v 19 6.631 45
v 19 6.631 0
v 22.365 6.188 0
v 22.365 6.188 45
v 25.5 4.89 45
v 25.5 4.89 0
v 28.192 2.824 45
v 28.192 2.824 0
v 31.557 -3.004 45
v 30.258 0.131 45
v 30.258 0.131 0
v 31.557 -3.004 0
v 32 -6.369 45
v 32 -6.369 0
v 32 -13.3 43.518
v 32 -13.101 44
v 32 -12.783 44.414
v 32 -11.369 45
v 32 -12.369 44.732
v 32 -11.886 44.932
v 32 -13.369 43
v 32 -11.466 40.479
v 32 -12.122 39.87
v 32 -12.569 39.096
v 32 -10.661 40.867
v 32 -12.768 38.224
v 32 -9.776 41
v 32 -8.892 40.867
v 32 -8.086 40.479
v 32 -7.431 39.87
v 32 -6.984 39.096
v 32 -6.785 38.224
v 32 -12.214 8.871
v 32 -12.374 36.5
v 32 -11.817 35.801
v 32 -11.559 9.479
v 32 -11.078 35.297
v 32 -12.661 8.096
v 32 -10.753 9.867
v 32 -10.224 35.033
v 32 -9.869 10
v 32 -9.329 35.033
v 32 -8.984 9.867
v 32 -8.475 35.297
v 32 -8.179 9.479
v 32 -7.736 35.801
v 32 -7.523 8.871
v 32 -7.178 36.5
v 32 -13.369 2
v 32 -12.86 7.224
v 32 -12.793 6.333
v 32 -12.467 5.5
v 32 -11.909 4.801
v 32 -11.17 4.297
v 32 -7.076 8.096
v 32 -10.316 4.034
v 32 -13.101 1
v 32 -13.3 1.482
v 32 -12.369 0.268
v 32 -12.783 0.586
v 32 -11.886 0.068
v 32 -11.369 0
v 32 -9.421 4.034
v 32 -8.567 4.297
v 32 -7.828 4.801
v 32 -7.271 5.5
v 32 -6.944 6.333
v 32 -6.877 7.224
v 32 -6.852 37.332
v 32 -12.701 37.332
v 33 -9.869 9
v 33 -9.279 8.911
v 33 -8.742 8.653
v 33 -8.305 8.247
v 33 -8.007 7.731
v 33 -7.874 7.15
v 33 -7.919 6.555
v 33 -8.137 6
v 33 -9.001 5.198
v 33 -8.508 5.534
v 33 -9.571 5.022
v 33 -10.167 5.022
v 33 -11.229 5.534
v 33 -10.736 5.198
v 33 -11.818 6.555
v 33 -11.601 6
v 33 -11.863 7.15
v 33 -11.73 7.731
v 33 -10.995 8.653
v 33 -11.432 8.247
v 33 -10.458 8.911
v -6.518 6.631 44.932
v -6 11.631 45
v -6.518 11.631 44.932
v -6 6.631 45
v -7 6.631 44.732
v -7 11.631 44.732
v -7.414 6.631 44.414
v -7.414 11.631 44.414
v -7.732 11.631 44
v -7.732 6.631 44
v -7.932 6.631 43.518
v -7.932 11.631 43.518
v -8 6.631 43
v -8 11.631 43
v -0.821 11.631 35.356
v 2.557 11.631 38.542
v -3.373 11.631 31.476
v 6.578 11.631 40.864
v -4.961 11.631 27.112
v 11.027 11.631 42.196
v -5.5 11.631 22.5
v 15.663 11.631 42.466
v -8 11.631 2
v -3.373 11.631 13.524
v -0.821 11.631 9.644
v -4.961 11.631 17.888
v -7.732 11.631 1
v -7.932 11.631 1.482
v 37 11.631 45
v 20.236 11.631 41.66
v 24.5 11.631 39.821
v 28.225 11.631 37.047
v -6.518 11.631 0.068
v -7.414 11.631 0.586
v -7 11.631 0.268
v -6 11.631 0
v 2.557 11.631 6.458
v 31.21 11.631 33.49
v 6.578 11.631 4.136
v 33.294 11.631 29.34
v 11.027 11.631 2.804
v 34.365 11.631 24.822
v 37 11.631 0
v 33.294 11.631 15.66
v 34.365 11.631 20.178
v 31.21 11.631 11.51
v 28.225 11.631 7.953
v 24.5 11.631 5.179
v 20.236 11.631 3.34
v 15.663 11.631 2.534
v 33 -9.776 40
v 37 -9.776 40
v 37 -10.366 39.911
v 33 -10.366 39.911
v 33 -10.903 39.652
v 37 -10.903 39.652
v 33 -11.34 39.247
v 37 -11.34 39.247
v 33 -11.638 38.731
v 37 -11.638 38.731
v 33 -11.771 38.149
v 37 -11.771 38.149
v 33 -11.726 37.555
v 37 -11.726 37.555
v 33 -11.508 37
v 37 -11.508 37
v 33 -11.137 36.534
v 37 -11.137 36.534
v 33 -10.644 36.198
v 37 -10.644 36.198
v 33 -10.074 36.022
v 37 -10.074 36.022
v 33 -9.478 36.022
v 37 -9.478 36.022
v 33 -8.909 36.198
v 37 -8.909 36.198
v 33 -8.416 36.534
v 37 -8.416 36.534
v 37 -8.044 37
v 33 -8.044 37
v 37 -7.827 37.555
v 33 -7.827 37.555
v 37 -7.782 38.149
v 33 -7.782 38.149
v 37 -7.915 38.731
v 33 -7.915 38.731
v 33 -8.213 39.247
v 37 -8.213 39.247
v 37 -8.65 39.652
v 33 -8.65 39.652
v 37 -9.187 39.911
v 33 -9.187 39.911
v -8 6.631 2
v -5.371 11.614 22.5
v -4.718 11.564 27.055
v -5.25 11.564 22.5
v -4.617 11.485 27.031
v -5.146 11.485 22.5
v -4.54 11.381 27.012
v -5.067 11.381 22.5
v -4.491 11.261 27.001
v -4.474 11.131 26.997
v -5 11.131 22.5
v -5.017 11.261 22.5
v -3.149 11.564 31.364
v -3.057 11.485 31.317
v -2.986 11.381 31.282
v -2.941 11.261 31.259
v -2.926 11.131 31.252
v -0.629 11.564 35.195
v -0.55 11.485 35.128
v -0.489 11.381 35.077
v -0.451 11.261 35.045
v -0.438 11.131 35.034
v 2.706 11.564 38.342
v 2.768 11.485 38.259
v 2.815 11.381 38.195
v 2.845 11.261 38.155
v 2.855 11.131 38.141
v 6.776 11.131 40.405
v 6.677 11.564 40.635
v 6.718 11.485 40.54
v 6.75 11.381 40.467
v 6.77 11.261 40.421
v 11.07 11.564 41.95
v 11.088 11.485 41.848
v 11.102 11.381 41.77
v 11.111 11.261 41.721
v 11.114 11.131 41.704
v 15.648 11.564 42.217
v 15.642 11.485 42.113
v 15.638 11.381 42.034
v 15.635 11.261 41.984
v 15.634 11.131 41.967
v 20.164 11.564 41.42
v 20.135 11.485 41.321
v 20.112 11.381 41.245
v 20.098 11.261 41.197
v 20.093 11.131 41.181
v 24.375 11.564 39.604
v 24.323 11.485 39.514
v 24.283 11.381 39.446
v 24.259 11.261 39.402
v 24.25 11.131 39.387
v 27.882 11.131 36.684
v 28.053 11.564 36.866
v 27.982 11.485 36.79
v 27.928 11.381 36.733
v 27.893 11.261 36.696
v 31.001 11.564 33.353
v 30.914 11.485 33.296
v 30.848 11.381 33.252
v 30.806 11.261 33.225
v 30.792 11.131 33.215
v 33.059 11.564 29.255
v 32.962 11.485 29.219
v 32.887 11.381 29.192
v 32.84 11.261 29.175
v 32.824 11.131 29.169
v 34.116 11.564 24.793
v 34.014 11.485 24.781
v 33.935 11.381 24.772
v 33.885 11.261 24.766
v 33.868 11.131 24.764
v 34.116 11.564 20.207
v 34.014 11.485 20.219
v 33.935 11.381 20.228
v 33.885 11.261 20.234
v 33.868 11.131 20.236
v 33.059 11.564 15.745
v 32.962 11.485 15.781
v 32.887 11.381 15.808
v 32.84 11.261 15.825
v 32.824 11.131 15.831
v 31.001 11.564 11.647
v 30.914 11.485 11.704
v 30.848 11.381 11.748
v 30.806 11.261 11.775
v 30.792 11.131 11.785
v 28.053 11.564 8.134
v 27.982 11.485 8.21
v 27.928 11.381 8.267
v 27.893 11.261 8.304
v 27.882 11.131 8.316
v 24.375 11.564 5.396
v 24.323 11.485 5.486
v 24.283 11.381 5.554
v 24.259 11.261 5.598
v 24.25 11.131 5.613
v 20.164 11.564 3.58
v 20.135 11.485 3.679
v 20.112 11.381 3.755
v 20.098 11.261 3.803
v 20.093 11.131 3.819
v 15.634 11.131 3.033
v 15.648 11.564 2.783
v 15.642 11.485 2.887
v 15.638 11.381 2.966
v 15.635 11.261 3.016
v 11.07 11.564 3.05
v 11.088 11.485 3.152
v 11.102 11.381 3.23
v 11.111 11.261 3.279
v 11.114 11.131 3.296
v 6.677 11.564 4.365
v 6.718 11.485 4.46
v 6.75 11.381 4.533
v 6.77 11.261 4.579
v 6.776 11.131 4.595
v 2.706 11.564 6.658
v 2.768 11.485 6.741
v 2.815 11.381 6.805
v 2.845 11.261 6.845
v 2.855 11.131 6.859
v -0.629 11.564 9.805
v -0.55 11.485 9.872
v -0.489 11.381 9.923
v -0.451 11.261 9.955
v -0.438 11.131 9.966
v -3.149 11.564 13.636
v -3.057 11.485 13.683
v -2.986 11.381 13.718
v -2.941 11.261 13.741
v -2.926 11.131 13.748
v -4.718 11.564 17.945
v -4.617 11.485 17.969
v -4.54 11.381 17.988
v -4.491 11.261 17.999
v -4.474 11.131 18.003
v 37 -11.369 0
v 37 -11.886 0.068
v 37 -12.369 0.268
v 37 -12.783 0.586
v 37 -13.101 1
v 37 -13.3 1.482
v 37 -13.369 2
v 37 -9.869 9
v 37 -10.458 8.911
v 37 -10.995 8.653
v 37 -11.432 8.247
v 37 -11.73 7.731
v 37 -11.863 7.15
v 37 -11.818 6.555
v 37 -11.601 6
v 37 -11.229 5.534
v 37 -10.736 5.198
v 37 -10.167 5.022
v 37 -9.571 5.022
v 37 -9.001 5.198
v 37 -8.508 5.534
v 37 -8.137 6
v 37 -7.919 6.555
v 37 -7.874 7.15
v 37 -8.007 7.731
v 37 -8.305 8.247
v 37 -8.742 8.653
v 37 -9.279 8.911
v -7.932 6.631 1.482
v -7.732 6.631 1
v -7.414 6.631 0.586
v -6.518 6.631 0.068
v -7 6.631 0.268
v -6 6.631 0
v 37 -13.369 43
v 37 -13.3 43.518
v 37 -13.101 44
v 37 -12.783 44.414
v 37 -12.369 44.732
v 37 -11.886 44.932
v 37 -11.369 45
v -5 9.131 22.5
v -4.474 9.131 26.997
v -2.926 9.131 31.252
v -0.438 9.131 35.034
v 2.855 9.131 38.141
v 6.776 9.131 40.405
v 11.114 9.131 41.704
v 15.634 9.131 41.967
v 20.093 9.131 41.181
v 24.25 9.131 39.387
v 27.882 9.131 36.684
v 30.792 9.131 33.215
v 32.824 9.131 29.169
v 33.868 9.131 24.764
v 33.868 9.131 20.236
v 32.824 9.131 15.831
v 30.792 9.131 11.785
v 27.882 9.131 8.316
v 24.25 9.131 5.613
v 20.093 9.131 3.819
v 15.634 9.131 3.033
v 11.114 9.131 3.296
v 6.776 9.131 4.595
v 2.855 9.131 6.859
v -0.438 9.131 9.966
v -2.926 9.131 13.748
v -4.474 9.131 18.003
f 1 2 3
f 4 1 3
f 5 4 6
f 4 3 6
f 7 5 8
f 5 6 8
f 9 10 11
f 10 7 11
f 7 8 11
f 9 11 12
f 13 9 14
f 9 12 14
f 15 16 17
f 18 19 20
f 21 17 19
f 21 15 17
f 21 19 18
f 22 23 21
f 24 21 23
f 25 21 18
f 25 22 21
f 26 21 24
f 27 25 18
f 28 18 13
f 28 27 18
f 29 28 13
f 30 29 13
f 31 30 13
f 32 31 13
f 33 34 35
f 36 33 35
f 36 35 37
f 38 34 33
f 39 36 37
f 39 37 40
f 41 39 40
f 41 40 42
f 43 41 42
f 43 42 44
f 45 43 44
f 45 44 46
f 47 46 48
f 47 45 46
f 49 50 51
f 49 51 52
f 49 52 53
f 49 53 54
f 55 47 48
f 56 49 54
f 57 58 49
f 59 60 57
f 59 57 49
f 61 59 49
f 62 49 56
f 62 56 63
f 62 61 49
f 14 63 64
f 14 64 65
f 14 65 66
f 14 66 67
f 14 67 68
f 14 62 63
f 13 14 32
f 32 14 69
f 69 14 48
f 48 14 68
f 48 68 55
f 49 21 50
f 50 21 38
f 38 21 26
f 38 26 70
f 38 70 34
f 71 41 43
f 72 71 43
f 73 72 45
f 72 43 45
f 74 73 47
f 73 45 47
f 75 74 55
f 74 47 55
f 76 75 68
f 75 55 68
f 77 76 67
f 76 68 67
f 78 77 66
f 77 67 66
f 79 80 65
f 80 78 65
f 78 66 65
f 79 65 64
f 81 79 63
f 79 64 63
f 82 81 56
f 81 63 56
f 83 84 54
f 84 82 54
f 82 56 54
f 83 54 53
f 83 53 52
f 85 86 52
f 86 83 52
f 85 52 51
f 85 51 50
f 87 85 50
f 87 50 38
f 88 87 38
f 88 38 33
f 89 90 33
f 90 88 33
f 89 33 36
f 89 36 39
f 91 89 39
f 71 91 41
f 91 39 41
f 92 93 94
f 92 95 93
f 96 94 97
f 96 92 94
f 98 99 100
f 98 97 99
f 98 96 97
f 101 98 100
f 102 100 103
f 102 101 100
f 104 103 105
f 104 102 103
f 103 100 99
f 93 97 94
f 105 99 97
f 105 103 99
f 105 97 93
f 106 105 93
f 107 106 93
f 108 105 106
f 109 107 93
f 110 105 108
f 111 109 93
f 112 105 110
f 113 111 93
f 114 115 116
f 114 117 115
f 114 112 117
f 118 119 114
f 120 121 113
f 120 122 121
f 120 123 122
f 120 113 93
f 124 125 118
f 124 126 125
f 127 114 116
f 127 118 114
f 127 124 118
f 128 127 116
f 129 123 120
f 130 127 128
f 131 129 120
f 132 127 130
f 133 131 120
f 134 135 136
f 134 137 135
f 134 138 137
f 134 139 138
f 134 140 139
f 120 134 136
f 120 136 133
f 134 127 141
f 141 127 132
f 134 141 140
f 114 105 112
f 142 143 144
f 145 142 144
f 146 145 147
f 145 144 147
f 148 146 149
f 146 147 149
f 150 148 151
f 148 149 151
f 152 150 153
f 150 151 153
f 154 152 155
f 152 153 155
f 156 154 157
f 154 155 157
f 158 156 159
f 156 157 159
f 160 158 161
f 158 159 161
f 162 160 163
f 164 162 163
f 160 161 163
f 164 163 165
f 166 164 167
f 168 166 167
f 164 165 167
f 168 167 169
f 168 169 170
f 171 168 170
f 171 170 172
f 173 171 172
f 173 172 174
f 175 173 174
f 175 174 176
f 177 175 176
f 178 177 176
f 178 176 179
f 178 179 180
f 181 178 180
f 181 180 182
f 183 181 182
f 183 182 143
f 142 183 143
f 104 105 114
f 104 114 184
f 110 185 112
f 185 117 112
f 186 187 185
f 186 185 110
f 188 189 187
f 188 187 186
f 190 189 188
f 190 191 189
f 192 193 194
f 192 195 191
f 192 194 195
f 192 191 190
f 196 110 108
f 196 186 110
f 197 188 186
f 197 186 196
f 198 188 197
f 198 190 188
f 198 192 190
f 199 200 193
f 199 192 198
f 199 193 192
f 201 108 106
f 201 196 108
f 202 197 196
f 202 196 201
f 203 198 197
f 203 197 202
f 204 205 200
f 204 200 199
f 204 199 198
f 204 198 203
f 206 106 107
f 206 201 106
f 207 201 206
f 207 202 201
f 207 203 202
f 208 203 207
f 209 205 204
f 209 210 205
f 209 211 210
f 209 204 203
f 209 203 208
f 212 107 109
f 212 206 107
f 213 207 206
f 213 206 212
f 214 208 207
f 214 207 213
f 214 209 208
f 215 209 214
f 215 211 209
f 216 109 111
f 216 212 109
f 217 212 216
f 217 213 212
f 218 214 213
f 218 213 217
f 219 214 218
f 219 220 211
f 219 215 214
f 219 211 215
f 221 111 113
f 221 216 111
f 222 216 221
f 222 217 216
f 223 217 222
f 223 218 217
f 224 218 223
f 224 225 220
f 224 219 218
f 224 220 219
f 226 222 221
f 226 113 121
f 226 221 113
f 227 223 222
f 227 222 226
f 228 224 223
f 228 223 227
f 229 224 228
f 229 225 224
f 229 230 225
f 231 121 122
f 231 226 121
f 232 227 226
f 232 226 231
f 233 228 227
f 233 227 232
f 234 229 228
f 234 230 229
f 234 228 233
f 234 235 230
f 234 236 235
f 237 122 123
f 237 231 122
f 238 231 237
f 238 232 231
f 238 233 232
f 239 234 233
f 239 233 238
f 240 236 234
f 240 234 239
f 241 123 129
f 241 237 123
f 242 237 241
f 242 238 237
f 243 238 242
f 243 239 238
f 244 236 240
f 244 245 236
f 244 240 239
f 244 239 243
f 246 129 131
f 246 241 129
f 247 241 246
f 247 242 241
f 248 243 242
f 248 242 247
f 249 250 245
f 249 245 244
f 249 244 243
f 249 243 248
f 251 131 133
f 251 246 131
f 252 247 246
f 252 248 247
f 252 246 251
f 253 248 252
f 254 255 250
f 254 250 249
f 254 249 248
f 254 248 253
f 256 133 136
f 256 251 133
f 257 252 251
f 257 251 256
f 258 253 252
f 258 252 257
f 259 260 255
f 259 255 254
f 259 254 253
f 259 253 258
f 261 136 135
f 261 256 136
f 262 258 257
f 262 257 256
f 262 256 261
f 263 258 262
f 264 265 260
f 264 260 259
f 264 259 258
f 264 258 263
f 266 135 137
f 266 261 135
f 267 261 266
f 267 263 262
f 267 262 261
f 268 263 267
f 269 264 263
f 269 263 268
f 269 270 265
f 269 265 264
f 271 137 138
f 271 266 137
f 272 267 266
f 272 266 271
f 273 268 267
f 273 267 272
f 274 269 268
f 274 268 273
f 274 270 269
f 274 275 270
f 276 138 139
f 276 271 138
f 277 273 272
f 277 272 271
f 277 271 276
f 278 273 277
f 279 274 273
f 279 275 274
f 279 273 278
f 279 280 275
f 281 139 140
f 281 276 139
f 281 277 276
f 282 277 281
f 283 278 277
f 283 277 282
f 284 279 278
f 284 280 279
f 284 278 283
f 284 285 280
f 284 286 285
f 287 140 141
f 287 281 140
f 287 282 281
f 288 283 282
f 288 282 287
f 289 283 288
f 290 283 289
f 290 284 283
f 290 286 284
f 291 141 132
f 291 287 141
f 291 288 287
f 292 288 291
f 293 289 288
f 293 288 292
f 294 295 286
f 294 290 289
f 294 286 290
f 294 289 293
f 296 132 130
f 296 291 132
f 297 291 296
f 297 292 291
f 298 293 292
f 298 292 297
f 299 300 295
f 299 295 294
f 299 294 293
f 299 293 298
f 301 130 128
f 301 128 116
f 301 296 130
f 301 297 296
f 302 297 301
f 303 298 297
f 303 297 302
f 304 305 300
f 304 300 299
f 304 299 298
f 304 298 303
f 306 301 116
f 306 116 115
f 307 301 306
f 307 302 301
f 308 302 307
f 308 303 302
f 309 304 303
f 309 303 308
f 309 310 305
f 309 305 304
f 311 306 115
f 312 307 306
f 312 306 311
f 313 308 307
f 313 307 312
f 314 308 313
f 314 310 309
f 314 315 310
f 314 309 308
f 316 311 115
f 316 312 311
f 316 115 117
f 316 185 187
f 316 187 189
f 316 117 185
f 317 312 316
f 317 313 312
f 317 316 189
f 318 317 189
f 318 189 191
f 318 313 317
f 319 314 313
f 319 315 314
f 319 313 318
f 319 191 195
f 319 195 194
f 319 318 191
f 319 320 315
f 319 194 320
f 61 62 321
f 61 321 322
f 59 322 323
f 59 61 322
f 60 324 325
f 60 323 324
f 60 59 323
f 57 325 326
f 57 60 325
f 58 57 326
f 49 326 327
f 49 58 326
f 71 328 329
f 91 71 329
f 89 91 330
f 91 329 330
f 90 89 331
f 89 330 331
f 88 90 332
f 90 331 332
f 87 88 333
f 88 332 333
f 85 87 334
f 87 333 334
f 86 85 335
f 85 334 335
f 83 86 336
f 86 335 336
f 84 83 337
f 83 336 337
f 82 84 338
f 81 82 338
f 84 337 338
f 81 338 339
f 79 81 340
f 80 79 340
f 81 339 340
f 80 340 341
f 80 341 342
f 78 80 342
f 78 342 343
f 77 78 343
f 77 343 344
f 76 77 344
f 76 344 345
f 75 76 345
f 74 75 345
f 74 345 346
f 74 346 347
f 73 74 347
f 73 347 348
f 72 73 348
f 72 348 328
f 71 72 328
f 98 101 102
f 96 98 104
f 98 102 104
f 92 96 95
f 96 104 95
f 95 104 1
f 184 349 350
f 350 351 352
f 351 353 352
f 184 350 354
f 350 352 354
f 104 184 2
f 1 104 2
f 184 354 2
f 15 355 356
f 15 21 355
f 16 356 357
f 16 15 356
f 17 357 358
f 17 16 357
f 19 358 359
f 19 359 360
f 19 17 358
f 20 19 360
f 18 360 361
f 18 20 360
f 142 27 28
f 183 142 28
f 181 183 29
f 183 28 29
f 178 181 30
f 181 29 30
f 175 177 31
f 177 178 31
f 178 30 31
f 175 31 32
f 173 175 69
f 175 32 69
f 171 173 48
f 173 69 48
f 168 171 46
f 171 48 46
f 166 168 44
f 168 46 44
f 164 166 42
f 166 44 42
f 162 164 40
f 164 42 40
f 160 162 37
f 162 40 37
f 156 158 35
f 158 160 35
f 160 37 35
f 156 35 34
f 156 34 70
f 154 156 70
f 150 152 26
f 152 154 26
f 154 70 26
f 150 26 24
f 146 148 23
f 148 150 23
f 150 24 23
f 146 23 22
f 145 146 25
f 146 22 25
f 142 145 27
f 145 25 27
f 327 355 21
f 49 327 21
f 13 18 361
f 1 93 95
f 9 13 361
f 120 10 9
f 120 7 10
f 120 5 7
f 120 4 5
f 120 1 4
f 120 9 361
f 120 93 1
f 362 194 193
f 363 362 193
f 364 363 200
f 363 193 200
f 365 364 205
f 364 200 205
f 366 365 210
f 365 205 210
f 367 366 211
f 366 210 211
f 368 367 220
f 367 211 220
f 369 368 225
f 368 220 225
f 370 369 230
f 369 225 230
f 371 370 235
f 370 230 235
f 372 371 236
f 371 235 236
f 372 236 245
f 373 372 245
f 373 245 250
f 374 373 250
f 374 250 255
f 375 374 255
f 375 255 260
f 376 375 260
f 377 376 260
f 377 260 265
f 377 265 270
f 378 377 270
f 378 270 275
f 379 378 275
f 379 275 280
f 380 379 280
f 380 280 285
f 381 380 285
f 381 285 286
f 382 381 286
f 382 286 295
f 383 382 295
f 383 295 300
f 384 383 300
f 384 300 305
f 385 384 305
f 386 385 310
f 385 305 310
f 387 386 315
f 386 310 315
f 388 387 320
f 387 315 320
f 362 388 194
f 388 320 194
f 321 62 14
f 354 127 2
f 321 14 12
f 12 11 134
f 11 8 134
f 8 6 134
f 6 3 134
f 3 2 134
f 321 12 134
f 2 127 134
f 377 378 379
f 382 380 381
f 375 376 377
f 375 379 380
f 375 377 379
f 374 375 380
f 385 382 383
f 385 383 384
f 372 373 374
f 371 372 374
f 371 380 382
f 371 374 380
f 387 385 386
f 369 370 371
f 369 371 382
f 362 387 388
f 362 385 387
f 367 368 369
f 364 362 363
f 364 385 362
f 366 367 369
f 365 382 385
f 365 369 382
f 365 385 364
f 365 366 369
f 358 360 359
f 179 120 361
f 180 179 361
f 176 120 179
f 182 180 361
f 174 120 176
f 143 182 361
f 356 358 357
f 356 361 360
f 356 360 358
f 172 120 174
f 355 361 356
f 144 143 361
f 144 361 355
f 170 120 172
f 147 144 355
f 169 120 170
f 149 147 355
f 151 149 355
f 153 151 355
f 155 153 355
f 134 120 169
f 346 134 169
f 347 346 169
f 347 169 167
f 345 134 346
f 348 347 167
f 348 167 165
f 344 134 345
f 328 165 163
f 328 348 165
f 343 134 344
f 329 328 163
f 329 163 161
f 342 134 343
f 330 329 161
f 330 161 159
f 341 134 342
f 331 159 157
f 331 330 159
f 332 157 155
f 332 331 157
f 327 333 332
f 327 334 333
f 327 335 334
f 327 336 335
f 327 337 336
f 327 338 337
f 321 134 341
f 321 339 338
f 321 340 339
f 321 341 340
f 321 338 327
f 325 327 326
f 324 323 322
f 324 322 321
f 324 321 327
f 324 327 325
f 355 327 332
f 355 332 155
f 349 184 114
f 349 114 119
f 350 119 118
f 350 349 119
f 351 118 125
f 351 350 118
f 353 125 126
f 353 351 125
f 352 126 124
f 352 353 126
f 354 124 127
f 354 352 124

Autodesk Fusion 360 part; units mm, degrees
sketch "Schizzo1" plane through (0, 0, 0) normal (0, 0, 1) x (1, 0, 0)
  line L0 (-8, 11.6314) -> (37, 11.6314)
  line L1 (37, 11.6314) -> (37, -13.3686)
  line L2 (37, -13.3686) -> (32, -13.3686)
  line L3 (32, -13.3686) -> (32, -6.3686)
  line L4 (-8, 11.6314) -> (-8, 6.6314)
  line L5 (-8, 6.6314) -> (19, 6.6314)
  arc A0 (32, -6.3686) -> (19, 6.6314) centre (19, -6.3686) ccw
  dimension "d1" = 5
  dimension "d2" = 5
  dimension "d3" = 45
  dimension "d4" = 25
  dimension "d5" = 13
extrude "Estrusione1" add sketch "Schizzo1" along normal blind 45
fillet "Raccordo1" radius 2 4 edges at (-8, 9.1314, 0) (-8, 9.1314, 45) (34.5, -13.3686, 45) (34.5, -13.3686, 0)
sketch "Schizzo2" plane through (32, 0, 0) normal (-1, 0, 0) x (0, -1, 0)
  arc A0 (11.3686, 0) -> (13.3686, 2) centre (11.3686, 2) ccw
  line L0 (13.3686, 2) -> (13.3686, 43)
  arc A1 (13.3686, 43) -> (11.3686, 45) centre (11.3686, 43) ccw
  line L1 (11.3686, 45) -> (6.3686, 45)
  line L2 (6.3686, 45) -> (6.3686, 0)
  line L3 (6.3686, 0) -> (11.3686, 0)
  line L4 (9.8686, 7.0001) -> (6.3686, 7.0001) construction
  line L5 (9.8686, 7.0001) -> (13.3686, 7.0001) construction
  line L6 (9.7764, 37.9999) -> (6.3686, 37.9999) construction
  line L7 (9.7764, 37.9999) -> (13.1842, 37.9999) construction
  line L8 (9.7764, 37.9999) -> (9.7764, 45) construction
  line L9 (9.8686, 7.0001) -> (9.8686, 0) construction
  point P0 (9.8686, 7.0001)
  point P1 (9.7764, 37.9999)
hole "Foratura1" at (32, -9.8686, 7.0001) at (32, -9.7764, 37.9999) direction (1, 0, 0) diameter 4 depth 11 tip angle 118 countersink diameter 6 countersink angle 90
sketch "Schizzo4" plane through (0, 11.6314, 0) normal (0, 1, 0) x (-1, 0, 0)
  arc A0 (8, 43) -> (6, 45) centre (6, 43) ccw
  line L0 (6, 45) -> (-37, 45)
  line L1 (-37, 45) -> (-37, 0)
  line L2 (-37, 0) -> (6, 0)
  arc A1 (6, 0) -> (8, 2) centre (6, 2) ccw
  line L3 (8, 2) -> (8, 43)
  circle A2 centre (-14.5, 22.5) radius 19.5
  dimension "d19" = 39
  dimension "d20" = 22.5
  dimension "d21" = 22.5
  dimension "d22" = 22.5
  dimension "d23" = 22.5
extrude "Estrusione2" cut sketch "Schizzo4" against normal blind 2.5 contours A2
fillet "Raccordo2" radius 0.5 1 edges at (32.6804, 11.6314, 29.5515)
